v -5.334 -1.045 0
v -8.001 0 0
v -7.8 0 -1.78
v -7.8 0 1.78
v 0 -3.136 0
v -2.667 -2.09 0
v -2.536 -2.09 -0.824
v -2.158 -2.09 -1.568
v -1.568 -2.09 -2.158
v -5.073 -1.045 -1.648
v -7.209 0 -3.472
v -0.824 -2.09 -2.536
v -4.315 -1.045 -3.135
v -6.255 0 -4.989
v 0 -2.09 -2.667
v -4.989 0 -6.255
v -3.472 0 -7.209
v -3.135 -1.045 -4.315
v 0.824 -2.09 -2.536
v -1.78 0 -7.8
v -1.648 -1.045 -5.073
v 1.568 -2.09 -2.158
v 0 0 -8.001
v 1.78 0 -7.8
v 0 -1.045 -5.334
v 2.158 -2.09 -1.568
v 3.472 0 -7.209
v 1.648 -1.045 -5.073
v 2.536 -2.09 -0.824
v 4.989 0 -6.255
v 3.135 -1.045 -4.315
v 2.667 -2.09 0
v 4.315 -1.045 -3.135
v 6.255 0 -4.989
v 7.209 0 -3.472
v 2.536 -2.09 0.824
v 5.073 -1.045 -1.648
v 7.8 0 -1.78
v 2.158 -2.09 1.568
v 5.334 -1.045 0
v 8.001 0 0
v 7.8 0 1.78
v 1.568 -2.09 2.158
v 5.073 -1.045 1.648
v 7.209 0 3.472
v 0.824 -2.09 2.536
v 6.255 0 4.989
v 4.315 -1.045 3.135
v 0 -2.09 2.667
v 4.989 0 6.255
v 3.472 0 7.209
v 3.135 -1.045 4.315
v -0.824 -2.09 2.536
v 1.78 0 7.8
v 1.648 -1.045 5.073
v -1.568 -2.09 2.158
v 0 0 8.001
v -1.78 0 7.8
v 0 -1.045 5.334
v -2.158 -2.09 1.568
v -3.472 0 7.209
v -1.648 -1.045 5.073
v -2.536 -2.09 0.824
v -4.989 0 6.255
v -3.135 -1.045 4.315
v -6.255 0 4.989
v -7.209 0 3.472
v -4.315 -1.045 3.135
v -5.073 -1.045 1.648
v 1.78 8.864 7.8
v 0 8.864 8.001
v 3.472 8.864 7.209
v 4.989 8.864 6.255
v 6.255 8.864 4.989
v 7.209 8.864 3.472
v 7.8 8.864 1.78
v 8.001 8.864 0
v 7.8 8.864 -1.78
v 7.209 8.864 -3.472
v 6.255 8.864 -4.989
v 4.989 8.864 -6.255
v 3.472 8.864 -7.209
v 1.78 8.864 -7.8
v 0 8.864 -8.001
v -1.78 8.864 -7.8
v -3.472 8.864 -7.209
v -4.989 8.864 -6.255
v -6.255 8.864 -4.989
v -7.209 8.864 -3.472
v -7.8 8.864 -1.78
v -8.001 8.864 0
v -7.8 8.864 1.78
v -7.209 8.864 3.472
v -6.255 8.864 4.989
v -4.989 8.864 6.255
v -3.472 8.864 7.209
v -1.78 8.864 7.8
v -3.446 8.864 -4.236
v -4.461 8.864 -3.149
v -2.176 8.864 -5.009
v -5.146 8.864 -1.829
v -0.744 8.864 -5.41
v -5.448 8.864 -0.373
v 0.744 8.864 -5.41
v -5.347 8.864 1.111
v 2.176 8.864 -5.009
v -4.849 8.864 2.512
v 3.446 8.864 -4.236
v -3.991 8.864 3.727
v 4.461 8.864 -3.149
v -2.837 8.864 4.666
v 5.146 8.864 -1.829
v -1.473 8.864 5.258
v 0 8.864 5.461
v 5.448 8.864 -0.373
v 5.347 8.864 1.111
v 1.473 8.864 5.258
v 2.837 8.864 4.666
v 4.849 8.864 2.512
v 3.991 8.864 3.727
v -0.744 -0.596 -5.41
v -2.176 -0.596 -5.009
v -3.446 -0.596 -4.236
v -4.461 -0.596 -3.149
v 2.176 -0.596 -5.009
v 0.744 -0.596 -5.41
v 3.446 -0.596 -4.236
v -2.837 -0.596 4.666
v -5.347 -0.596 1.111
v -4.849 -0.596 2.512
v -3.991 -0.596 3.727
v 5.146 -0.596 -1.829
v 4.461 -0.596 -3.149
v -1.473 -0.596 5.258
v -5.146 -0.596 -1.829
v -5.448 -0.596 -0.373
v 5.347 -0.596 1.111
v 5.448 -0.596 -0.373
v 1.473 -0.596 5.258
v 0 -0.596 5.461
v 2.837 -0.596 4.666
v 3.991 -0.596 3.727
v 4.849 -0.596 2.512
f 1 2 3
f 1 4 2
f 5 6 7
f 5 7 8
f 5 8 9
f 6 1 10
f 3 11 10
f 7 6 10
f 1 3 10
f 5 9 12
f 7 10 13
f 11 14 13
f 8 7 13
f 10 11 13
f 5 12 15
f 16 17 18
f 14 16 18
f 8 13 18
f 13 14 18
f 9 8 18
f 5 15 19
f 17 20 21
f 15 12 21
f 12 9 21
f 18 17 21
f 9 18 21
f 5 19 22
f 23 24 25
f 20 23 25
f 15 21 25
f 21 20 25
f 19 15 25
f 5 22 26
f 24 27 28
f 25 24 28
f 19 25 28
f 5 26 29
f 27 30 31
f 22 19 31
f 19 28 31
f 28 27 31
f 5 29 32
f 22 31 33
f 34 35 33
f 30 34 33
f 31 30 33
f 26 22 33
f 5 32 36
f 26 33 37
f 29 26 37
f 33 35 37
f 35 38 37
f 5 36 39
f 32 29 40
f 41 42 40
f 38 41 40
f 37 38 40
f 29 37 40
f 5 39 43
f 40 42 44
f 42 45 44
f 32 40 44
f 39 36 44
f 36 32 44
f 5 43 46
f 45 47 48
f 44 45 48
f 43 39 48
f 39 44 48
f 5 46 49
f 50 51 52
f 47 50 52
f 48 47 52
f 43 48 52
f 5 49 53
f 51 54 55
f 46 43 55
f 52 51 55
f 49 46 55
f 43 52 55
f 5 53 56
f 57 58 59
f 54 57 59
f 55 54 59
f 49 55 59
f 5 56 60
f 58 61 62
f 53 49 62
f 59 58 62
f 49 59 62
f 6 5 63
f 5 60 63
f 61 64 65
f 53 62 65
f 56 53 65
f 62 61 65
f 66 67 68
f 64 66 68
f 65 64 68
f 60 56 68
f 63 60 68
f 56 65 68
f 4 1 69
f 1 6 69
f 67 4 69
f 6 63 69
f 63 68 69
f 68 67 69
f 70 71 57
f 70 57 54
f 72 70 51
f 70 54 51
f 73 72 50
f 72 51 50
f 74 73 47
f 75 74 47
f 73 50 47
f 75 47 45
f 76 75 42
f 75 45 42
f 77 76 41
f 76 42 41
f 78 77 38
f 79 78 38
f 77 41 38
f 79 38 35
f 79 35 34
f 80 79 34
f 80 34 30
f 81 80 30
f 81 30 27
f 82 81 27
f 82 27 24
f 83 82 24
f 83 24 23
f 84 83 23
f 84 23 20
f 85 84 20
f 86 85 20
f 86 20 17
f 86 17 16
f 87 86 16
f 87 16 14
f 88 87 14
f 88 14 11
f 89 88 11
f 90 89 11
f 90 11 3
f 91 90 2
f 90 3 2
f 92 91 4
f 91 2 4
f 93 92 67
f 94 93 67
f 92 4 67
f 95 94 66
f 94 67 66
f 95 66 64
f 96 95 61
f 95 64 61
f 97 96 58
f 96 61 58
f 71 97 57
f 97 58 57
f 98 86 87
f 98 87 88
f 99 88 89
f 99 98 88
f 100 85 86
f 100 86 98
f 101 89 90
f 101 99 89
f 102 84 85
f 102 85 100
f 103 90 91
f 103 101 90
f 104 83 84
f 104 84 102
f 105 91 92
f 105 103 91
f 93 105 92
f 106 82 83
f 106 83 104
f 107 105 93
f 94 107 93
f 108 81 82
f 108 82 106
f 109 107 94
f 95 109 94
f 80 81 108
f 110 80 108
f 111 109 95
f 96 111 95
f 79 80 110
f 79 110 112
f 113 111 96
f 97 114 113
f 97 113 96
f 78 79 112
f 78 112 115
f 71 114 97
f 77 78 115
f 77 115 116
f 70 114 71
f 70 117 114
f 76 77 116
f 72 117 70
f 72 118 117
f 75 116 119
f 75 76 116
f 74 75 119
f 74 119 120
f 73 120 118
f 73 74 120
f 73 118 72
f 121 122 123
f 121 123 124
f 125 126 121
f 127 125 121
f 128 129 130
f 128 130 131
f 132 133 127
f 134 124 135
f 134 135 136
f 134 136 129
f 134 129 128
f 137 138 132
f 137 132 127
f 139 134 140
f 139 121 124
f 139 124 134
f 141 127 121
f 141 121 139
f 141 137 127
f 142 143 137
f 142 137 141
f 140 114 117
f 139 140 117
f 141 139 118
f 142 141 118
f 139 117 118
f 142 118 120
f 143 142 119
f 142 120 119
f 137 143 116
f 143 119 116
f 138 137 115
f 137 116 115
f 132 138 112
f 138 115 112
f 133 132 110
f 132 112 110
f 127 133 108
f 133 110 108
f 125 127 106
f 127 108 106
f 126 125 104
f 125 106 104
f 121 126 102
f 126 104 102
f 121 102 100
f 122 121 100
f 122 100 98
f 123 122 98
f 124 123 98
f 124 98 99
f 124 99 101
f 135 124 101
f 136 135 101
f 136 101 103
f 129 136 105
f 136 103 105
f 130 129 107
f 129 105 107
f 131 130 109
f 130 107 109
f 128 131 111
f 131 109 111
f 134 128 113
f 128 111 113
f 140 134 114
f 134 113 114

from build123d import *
from OCP.BRepAlgoAPI import BRepAlgoAPI_Cut
from OCP.TopTools import TopTools_ListOfShape

# Parameters (mm, degrees)
SKETCH1_R           = 8.001
SKETCH1_R_2         = 5.461
BOSS_EXTRUDE1_DEPTH = 8.864442387
CUT_EXTRUDE1_START  = 8.864442
SKETCH1_6_R         = 5.461
CUT_EXTRUDE1_DEPTH  = 9.46


with BuildPart() as part:
    # Sketch1 → Boss-Extrude1 (new body)
    # profile 1 of 2: a face of its own
    with BuildSketch(Plane(origin=(0, 0, 0), x_dir=(1, 0, 0), z_dir=(0, 1, 0))):
        with Locations(Location((0, 0, 0), (0, 0, 270))):
            Circle(SKETCH1_R)
        Circle(SKETCH1_R_2, mode=Mode.SUBTRACT)
    # profile 2 of 2: a face of its own
    with BuildSketch(Plane(origin=(0, 0, 0), x_dir=(1, 0, 0), z_dir=(0, 1, 0))):
        Circle(SKETCH1_R_2)
    extrude(amount=BOSS_EXTRUDE1_DEPTH)

    # Sketch2 → Revolve1 (revolve)
    with BuildSketch(Plane.XY, mode=Mode.PRIVATE) as revolve1_sk:
        Polygon((0, 0), (0, -3.135557613), (8.001, 0), align=None)
    revolve(revolve1_sk.sketch.rotate(Axis((0, 0, 0), (0, -1, 0)), 180), axis=Axis((0, 0, 0), (0, -1, 0)))


with BuildPart() as cut_extrude1_tool:
    # Sketch1<6> → Cut-Extrude1 (new body)
    with BuildSketch(Plane(origin=(0, 0, 0), x_dir=(1, 0, 0), z_dir=(0, 1, 0)).offset(CUT_EXTRUDE1_START)):
        with Locations(Location((0, 0, 0), (0, 0, 270))):
            Circle(SKETCH1_6_R)
    extrude(amount=-CUT_EXTRUDE1_DEPTH)


with BuildPart() as part_1:
    add(part.part)

    # Cut-Extrude1: cut by cut_extrude1_tool, with a tolerance
    cut_extrude1_stock = TopTools_ListOfShape()
    cut_extrude1_stock.Append(part_1.part.wrapped)
    cut_extrude1_tools = TopTools_ListOfShape()
    cut_extrude1_tools.Append(cut_extrude1_tool.part.wrapped)
    cut_extrude1_cut = BRepAlgoAPI_Cut()
    cut_extrude1_cut.SetArguments(cut_extrude1_stock)
    cut_extrude1_cut.SetTools(cut_extrude1_tools)
    cut_extrude1_cut.SetFuzzyValue(0.00001)
    cut_extrude1_cut.Build()
    add(Compound.cast(cut_extrude1_cut.Shape()).solids(), mode=Mode.REPLACE)


solid = part_1.part
